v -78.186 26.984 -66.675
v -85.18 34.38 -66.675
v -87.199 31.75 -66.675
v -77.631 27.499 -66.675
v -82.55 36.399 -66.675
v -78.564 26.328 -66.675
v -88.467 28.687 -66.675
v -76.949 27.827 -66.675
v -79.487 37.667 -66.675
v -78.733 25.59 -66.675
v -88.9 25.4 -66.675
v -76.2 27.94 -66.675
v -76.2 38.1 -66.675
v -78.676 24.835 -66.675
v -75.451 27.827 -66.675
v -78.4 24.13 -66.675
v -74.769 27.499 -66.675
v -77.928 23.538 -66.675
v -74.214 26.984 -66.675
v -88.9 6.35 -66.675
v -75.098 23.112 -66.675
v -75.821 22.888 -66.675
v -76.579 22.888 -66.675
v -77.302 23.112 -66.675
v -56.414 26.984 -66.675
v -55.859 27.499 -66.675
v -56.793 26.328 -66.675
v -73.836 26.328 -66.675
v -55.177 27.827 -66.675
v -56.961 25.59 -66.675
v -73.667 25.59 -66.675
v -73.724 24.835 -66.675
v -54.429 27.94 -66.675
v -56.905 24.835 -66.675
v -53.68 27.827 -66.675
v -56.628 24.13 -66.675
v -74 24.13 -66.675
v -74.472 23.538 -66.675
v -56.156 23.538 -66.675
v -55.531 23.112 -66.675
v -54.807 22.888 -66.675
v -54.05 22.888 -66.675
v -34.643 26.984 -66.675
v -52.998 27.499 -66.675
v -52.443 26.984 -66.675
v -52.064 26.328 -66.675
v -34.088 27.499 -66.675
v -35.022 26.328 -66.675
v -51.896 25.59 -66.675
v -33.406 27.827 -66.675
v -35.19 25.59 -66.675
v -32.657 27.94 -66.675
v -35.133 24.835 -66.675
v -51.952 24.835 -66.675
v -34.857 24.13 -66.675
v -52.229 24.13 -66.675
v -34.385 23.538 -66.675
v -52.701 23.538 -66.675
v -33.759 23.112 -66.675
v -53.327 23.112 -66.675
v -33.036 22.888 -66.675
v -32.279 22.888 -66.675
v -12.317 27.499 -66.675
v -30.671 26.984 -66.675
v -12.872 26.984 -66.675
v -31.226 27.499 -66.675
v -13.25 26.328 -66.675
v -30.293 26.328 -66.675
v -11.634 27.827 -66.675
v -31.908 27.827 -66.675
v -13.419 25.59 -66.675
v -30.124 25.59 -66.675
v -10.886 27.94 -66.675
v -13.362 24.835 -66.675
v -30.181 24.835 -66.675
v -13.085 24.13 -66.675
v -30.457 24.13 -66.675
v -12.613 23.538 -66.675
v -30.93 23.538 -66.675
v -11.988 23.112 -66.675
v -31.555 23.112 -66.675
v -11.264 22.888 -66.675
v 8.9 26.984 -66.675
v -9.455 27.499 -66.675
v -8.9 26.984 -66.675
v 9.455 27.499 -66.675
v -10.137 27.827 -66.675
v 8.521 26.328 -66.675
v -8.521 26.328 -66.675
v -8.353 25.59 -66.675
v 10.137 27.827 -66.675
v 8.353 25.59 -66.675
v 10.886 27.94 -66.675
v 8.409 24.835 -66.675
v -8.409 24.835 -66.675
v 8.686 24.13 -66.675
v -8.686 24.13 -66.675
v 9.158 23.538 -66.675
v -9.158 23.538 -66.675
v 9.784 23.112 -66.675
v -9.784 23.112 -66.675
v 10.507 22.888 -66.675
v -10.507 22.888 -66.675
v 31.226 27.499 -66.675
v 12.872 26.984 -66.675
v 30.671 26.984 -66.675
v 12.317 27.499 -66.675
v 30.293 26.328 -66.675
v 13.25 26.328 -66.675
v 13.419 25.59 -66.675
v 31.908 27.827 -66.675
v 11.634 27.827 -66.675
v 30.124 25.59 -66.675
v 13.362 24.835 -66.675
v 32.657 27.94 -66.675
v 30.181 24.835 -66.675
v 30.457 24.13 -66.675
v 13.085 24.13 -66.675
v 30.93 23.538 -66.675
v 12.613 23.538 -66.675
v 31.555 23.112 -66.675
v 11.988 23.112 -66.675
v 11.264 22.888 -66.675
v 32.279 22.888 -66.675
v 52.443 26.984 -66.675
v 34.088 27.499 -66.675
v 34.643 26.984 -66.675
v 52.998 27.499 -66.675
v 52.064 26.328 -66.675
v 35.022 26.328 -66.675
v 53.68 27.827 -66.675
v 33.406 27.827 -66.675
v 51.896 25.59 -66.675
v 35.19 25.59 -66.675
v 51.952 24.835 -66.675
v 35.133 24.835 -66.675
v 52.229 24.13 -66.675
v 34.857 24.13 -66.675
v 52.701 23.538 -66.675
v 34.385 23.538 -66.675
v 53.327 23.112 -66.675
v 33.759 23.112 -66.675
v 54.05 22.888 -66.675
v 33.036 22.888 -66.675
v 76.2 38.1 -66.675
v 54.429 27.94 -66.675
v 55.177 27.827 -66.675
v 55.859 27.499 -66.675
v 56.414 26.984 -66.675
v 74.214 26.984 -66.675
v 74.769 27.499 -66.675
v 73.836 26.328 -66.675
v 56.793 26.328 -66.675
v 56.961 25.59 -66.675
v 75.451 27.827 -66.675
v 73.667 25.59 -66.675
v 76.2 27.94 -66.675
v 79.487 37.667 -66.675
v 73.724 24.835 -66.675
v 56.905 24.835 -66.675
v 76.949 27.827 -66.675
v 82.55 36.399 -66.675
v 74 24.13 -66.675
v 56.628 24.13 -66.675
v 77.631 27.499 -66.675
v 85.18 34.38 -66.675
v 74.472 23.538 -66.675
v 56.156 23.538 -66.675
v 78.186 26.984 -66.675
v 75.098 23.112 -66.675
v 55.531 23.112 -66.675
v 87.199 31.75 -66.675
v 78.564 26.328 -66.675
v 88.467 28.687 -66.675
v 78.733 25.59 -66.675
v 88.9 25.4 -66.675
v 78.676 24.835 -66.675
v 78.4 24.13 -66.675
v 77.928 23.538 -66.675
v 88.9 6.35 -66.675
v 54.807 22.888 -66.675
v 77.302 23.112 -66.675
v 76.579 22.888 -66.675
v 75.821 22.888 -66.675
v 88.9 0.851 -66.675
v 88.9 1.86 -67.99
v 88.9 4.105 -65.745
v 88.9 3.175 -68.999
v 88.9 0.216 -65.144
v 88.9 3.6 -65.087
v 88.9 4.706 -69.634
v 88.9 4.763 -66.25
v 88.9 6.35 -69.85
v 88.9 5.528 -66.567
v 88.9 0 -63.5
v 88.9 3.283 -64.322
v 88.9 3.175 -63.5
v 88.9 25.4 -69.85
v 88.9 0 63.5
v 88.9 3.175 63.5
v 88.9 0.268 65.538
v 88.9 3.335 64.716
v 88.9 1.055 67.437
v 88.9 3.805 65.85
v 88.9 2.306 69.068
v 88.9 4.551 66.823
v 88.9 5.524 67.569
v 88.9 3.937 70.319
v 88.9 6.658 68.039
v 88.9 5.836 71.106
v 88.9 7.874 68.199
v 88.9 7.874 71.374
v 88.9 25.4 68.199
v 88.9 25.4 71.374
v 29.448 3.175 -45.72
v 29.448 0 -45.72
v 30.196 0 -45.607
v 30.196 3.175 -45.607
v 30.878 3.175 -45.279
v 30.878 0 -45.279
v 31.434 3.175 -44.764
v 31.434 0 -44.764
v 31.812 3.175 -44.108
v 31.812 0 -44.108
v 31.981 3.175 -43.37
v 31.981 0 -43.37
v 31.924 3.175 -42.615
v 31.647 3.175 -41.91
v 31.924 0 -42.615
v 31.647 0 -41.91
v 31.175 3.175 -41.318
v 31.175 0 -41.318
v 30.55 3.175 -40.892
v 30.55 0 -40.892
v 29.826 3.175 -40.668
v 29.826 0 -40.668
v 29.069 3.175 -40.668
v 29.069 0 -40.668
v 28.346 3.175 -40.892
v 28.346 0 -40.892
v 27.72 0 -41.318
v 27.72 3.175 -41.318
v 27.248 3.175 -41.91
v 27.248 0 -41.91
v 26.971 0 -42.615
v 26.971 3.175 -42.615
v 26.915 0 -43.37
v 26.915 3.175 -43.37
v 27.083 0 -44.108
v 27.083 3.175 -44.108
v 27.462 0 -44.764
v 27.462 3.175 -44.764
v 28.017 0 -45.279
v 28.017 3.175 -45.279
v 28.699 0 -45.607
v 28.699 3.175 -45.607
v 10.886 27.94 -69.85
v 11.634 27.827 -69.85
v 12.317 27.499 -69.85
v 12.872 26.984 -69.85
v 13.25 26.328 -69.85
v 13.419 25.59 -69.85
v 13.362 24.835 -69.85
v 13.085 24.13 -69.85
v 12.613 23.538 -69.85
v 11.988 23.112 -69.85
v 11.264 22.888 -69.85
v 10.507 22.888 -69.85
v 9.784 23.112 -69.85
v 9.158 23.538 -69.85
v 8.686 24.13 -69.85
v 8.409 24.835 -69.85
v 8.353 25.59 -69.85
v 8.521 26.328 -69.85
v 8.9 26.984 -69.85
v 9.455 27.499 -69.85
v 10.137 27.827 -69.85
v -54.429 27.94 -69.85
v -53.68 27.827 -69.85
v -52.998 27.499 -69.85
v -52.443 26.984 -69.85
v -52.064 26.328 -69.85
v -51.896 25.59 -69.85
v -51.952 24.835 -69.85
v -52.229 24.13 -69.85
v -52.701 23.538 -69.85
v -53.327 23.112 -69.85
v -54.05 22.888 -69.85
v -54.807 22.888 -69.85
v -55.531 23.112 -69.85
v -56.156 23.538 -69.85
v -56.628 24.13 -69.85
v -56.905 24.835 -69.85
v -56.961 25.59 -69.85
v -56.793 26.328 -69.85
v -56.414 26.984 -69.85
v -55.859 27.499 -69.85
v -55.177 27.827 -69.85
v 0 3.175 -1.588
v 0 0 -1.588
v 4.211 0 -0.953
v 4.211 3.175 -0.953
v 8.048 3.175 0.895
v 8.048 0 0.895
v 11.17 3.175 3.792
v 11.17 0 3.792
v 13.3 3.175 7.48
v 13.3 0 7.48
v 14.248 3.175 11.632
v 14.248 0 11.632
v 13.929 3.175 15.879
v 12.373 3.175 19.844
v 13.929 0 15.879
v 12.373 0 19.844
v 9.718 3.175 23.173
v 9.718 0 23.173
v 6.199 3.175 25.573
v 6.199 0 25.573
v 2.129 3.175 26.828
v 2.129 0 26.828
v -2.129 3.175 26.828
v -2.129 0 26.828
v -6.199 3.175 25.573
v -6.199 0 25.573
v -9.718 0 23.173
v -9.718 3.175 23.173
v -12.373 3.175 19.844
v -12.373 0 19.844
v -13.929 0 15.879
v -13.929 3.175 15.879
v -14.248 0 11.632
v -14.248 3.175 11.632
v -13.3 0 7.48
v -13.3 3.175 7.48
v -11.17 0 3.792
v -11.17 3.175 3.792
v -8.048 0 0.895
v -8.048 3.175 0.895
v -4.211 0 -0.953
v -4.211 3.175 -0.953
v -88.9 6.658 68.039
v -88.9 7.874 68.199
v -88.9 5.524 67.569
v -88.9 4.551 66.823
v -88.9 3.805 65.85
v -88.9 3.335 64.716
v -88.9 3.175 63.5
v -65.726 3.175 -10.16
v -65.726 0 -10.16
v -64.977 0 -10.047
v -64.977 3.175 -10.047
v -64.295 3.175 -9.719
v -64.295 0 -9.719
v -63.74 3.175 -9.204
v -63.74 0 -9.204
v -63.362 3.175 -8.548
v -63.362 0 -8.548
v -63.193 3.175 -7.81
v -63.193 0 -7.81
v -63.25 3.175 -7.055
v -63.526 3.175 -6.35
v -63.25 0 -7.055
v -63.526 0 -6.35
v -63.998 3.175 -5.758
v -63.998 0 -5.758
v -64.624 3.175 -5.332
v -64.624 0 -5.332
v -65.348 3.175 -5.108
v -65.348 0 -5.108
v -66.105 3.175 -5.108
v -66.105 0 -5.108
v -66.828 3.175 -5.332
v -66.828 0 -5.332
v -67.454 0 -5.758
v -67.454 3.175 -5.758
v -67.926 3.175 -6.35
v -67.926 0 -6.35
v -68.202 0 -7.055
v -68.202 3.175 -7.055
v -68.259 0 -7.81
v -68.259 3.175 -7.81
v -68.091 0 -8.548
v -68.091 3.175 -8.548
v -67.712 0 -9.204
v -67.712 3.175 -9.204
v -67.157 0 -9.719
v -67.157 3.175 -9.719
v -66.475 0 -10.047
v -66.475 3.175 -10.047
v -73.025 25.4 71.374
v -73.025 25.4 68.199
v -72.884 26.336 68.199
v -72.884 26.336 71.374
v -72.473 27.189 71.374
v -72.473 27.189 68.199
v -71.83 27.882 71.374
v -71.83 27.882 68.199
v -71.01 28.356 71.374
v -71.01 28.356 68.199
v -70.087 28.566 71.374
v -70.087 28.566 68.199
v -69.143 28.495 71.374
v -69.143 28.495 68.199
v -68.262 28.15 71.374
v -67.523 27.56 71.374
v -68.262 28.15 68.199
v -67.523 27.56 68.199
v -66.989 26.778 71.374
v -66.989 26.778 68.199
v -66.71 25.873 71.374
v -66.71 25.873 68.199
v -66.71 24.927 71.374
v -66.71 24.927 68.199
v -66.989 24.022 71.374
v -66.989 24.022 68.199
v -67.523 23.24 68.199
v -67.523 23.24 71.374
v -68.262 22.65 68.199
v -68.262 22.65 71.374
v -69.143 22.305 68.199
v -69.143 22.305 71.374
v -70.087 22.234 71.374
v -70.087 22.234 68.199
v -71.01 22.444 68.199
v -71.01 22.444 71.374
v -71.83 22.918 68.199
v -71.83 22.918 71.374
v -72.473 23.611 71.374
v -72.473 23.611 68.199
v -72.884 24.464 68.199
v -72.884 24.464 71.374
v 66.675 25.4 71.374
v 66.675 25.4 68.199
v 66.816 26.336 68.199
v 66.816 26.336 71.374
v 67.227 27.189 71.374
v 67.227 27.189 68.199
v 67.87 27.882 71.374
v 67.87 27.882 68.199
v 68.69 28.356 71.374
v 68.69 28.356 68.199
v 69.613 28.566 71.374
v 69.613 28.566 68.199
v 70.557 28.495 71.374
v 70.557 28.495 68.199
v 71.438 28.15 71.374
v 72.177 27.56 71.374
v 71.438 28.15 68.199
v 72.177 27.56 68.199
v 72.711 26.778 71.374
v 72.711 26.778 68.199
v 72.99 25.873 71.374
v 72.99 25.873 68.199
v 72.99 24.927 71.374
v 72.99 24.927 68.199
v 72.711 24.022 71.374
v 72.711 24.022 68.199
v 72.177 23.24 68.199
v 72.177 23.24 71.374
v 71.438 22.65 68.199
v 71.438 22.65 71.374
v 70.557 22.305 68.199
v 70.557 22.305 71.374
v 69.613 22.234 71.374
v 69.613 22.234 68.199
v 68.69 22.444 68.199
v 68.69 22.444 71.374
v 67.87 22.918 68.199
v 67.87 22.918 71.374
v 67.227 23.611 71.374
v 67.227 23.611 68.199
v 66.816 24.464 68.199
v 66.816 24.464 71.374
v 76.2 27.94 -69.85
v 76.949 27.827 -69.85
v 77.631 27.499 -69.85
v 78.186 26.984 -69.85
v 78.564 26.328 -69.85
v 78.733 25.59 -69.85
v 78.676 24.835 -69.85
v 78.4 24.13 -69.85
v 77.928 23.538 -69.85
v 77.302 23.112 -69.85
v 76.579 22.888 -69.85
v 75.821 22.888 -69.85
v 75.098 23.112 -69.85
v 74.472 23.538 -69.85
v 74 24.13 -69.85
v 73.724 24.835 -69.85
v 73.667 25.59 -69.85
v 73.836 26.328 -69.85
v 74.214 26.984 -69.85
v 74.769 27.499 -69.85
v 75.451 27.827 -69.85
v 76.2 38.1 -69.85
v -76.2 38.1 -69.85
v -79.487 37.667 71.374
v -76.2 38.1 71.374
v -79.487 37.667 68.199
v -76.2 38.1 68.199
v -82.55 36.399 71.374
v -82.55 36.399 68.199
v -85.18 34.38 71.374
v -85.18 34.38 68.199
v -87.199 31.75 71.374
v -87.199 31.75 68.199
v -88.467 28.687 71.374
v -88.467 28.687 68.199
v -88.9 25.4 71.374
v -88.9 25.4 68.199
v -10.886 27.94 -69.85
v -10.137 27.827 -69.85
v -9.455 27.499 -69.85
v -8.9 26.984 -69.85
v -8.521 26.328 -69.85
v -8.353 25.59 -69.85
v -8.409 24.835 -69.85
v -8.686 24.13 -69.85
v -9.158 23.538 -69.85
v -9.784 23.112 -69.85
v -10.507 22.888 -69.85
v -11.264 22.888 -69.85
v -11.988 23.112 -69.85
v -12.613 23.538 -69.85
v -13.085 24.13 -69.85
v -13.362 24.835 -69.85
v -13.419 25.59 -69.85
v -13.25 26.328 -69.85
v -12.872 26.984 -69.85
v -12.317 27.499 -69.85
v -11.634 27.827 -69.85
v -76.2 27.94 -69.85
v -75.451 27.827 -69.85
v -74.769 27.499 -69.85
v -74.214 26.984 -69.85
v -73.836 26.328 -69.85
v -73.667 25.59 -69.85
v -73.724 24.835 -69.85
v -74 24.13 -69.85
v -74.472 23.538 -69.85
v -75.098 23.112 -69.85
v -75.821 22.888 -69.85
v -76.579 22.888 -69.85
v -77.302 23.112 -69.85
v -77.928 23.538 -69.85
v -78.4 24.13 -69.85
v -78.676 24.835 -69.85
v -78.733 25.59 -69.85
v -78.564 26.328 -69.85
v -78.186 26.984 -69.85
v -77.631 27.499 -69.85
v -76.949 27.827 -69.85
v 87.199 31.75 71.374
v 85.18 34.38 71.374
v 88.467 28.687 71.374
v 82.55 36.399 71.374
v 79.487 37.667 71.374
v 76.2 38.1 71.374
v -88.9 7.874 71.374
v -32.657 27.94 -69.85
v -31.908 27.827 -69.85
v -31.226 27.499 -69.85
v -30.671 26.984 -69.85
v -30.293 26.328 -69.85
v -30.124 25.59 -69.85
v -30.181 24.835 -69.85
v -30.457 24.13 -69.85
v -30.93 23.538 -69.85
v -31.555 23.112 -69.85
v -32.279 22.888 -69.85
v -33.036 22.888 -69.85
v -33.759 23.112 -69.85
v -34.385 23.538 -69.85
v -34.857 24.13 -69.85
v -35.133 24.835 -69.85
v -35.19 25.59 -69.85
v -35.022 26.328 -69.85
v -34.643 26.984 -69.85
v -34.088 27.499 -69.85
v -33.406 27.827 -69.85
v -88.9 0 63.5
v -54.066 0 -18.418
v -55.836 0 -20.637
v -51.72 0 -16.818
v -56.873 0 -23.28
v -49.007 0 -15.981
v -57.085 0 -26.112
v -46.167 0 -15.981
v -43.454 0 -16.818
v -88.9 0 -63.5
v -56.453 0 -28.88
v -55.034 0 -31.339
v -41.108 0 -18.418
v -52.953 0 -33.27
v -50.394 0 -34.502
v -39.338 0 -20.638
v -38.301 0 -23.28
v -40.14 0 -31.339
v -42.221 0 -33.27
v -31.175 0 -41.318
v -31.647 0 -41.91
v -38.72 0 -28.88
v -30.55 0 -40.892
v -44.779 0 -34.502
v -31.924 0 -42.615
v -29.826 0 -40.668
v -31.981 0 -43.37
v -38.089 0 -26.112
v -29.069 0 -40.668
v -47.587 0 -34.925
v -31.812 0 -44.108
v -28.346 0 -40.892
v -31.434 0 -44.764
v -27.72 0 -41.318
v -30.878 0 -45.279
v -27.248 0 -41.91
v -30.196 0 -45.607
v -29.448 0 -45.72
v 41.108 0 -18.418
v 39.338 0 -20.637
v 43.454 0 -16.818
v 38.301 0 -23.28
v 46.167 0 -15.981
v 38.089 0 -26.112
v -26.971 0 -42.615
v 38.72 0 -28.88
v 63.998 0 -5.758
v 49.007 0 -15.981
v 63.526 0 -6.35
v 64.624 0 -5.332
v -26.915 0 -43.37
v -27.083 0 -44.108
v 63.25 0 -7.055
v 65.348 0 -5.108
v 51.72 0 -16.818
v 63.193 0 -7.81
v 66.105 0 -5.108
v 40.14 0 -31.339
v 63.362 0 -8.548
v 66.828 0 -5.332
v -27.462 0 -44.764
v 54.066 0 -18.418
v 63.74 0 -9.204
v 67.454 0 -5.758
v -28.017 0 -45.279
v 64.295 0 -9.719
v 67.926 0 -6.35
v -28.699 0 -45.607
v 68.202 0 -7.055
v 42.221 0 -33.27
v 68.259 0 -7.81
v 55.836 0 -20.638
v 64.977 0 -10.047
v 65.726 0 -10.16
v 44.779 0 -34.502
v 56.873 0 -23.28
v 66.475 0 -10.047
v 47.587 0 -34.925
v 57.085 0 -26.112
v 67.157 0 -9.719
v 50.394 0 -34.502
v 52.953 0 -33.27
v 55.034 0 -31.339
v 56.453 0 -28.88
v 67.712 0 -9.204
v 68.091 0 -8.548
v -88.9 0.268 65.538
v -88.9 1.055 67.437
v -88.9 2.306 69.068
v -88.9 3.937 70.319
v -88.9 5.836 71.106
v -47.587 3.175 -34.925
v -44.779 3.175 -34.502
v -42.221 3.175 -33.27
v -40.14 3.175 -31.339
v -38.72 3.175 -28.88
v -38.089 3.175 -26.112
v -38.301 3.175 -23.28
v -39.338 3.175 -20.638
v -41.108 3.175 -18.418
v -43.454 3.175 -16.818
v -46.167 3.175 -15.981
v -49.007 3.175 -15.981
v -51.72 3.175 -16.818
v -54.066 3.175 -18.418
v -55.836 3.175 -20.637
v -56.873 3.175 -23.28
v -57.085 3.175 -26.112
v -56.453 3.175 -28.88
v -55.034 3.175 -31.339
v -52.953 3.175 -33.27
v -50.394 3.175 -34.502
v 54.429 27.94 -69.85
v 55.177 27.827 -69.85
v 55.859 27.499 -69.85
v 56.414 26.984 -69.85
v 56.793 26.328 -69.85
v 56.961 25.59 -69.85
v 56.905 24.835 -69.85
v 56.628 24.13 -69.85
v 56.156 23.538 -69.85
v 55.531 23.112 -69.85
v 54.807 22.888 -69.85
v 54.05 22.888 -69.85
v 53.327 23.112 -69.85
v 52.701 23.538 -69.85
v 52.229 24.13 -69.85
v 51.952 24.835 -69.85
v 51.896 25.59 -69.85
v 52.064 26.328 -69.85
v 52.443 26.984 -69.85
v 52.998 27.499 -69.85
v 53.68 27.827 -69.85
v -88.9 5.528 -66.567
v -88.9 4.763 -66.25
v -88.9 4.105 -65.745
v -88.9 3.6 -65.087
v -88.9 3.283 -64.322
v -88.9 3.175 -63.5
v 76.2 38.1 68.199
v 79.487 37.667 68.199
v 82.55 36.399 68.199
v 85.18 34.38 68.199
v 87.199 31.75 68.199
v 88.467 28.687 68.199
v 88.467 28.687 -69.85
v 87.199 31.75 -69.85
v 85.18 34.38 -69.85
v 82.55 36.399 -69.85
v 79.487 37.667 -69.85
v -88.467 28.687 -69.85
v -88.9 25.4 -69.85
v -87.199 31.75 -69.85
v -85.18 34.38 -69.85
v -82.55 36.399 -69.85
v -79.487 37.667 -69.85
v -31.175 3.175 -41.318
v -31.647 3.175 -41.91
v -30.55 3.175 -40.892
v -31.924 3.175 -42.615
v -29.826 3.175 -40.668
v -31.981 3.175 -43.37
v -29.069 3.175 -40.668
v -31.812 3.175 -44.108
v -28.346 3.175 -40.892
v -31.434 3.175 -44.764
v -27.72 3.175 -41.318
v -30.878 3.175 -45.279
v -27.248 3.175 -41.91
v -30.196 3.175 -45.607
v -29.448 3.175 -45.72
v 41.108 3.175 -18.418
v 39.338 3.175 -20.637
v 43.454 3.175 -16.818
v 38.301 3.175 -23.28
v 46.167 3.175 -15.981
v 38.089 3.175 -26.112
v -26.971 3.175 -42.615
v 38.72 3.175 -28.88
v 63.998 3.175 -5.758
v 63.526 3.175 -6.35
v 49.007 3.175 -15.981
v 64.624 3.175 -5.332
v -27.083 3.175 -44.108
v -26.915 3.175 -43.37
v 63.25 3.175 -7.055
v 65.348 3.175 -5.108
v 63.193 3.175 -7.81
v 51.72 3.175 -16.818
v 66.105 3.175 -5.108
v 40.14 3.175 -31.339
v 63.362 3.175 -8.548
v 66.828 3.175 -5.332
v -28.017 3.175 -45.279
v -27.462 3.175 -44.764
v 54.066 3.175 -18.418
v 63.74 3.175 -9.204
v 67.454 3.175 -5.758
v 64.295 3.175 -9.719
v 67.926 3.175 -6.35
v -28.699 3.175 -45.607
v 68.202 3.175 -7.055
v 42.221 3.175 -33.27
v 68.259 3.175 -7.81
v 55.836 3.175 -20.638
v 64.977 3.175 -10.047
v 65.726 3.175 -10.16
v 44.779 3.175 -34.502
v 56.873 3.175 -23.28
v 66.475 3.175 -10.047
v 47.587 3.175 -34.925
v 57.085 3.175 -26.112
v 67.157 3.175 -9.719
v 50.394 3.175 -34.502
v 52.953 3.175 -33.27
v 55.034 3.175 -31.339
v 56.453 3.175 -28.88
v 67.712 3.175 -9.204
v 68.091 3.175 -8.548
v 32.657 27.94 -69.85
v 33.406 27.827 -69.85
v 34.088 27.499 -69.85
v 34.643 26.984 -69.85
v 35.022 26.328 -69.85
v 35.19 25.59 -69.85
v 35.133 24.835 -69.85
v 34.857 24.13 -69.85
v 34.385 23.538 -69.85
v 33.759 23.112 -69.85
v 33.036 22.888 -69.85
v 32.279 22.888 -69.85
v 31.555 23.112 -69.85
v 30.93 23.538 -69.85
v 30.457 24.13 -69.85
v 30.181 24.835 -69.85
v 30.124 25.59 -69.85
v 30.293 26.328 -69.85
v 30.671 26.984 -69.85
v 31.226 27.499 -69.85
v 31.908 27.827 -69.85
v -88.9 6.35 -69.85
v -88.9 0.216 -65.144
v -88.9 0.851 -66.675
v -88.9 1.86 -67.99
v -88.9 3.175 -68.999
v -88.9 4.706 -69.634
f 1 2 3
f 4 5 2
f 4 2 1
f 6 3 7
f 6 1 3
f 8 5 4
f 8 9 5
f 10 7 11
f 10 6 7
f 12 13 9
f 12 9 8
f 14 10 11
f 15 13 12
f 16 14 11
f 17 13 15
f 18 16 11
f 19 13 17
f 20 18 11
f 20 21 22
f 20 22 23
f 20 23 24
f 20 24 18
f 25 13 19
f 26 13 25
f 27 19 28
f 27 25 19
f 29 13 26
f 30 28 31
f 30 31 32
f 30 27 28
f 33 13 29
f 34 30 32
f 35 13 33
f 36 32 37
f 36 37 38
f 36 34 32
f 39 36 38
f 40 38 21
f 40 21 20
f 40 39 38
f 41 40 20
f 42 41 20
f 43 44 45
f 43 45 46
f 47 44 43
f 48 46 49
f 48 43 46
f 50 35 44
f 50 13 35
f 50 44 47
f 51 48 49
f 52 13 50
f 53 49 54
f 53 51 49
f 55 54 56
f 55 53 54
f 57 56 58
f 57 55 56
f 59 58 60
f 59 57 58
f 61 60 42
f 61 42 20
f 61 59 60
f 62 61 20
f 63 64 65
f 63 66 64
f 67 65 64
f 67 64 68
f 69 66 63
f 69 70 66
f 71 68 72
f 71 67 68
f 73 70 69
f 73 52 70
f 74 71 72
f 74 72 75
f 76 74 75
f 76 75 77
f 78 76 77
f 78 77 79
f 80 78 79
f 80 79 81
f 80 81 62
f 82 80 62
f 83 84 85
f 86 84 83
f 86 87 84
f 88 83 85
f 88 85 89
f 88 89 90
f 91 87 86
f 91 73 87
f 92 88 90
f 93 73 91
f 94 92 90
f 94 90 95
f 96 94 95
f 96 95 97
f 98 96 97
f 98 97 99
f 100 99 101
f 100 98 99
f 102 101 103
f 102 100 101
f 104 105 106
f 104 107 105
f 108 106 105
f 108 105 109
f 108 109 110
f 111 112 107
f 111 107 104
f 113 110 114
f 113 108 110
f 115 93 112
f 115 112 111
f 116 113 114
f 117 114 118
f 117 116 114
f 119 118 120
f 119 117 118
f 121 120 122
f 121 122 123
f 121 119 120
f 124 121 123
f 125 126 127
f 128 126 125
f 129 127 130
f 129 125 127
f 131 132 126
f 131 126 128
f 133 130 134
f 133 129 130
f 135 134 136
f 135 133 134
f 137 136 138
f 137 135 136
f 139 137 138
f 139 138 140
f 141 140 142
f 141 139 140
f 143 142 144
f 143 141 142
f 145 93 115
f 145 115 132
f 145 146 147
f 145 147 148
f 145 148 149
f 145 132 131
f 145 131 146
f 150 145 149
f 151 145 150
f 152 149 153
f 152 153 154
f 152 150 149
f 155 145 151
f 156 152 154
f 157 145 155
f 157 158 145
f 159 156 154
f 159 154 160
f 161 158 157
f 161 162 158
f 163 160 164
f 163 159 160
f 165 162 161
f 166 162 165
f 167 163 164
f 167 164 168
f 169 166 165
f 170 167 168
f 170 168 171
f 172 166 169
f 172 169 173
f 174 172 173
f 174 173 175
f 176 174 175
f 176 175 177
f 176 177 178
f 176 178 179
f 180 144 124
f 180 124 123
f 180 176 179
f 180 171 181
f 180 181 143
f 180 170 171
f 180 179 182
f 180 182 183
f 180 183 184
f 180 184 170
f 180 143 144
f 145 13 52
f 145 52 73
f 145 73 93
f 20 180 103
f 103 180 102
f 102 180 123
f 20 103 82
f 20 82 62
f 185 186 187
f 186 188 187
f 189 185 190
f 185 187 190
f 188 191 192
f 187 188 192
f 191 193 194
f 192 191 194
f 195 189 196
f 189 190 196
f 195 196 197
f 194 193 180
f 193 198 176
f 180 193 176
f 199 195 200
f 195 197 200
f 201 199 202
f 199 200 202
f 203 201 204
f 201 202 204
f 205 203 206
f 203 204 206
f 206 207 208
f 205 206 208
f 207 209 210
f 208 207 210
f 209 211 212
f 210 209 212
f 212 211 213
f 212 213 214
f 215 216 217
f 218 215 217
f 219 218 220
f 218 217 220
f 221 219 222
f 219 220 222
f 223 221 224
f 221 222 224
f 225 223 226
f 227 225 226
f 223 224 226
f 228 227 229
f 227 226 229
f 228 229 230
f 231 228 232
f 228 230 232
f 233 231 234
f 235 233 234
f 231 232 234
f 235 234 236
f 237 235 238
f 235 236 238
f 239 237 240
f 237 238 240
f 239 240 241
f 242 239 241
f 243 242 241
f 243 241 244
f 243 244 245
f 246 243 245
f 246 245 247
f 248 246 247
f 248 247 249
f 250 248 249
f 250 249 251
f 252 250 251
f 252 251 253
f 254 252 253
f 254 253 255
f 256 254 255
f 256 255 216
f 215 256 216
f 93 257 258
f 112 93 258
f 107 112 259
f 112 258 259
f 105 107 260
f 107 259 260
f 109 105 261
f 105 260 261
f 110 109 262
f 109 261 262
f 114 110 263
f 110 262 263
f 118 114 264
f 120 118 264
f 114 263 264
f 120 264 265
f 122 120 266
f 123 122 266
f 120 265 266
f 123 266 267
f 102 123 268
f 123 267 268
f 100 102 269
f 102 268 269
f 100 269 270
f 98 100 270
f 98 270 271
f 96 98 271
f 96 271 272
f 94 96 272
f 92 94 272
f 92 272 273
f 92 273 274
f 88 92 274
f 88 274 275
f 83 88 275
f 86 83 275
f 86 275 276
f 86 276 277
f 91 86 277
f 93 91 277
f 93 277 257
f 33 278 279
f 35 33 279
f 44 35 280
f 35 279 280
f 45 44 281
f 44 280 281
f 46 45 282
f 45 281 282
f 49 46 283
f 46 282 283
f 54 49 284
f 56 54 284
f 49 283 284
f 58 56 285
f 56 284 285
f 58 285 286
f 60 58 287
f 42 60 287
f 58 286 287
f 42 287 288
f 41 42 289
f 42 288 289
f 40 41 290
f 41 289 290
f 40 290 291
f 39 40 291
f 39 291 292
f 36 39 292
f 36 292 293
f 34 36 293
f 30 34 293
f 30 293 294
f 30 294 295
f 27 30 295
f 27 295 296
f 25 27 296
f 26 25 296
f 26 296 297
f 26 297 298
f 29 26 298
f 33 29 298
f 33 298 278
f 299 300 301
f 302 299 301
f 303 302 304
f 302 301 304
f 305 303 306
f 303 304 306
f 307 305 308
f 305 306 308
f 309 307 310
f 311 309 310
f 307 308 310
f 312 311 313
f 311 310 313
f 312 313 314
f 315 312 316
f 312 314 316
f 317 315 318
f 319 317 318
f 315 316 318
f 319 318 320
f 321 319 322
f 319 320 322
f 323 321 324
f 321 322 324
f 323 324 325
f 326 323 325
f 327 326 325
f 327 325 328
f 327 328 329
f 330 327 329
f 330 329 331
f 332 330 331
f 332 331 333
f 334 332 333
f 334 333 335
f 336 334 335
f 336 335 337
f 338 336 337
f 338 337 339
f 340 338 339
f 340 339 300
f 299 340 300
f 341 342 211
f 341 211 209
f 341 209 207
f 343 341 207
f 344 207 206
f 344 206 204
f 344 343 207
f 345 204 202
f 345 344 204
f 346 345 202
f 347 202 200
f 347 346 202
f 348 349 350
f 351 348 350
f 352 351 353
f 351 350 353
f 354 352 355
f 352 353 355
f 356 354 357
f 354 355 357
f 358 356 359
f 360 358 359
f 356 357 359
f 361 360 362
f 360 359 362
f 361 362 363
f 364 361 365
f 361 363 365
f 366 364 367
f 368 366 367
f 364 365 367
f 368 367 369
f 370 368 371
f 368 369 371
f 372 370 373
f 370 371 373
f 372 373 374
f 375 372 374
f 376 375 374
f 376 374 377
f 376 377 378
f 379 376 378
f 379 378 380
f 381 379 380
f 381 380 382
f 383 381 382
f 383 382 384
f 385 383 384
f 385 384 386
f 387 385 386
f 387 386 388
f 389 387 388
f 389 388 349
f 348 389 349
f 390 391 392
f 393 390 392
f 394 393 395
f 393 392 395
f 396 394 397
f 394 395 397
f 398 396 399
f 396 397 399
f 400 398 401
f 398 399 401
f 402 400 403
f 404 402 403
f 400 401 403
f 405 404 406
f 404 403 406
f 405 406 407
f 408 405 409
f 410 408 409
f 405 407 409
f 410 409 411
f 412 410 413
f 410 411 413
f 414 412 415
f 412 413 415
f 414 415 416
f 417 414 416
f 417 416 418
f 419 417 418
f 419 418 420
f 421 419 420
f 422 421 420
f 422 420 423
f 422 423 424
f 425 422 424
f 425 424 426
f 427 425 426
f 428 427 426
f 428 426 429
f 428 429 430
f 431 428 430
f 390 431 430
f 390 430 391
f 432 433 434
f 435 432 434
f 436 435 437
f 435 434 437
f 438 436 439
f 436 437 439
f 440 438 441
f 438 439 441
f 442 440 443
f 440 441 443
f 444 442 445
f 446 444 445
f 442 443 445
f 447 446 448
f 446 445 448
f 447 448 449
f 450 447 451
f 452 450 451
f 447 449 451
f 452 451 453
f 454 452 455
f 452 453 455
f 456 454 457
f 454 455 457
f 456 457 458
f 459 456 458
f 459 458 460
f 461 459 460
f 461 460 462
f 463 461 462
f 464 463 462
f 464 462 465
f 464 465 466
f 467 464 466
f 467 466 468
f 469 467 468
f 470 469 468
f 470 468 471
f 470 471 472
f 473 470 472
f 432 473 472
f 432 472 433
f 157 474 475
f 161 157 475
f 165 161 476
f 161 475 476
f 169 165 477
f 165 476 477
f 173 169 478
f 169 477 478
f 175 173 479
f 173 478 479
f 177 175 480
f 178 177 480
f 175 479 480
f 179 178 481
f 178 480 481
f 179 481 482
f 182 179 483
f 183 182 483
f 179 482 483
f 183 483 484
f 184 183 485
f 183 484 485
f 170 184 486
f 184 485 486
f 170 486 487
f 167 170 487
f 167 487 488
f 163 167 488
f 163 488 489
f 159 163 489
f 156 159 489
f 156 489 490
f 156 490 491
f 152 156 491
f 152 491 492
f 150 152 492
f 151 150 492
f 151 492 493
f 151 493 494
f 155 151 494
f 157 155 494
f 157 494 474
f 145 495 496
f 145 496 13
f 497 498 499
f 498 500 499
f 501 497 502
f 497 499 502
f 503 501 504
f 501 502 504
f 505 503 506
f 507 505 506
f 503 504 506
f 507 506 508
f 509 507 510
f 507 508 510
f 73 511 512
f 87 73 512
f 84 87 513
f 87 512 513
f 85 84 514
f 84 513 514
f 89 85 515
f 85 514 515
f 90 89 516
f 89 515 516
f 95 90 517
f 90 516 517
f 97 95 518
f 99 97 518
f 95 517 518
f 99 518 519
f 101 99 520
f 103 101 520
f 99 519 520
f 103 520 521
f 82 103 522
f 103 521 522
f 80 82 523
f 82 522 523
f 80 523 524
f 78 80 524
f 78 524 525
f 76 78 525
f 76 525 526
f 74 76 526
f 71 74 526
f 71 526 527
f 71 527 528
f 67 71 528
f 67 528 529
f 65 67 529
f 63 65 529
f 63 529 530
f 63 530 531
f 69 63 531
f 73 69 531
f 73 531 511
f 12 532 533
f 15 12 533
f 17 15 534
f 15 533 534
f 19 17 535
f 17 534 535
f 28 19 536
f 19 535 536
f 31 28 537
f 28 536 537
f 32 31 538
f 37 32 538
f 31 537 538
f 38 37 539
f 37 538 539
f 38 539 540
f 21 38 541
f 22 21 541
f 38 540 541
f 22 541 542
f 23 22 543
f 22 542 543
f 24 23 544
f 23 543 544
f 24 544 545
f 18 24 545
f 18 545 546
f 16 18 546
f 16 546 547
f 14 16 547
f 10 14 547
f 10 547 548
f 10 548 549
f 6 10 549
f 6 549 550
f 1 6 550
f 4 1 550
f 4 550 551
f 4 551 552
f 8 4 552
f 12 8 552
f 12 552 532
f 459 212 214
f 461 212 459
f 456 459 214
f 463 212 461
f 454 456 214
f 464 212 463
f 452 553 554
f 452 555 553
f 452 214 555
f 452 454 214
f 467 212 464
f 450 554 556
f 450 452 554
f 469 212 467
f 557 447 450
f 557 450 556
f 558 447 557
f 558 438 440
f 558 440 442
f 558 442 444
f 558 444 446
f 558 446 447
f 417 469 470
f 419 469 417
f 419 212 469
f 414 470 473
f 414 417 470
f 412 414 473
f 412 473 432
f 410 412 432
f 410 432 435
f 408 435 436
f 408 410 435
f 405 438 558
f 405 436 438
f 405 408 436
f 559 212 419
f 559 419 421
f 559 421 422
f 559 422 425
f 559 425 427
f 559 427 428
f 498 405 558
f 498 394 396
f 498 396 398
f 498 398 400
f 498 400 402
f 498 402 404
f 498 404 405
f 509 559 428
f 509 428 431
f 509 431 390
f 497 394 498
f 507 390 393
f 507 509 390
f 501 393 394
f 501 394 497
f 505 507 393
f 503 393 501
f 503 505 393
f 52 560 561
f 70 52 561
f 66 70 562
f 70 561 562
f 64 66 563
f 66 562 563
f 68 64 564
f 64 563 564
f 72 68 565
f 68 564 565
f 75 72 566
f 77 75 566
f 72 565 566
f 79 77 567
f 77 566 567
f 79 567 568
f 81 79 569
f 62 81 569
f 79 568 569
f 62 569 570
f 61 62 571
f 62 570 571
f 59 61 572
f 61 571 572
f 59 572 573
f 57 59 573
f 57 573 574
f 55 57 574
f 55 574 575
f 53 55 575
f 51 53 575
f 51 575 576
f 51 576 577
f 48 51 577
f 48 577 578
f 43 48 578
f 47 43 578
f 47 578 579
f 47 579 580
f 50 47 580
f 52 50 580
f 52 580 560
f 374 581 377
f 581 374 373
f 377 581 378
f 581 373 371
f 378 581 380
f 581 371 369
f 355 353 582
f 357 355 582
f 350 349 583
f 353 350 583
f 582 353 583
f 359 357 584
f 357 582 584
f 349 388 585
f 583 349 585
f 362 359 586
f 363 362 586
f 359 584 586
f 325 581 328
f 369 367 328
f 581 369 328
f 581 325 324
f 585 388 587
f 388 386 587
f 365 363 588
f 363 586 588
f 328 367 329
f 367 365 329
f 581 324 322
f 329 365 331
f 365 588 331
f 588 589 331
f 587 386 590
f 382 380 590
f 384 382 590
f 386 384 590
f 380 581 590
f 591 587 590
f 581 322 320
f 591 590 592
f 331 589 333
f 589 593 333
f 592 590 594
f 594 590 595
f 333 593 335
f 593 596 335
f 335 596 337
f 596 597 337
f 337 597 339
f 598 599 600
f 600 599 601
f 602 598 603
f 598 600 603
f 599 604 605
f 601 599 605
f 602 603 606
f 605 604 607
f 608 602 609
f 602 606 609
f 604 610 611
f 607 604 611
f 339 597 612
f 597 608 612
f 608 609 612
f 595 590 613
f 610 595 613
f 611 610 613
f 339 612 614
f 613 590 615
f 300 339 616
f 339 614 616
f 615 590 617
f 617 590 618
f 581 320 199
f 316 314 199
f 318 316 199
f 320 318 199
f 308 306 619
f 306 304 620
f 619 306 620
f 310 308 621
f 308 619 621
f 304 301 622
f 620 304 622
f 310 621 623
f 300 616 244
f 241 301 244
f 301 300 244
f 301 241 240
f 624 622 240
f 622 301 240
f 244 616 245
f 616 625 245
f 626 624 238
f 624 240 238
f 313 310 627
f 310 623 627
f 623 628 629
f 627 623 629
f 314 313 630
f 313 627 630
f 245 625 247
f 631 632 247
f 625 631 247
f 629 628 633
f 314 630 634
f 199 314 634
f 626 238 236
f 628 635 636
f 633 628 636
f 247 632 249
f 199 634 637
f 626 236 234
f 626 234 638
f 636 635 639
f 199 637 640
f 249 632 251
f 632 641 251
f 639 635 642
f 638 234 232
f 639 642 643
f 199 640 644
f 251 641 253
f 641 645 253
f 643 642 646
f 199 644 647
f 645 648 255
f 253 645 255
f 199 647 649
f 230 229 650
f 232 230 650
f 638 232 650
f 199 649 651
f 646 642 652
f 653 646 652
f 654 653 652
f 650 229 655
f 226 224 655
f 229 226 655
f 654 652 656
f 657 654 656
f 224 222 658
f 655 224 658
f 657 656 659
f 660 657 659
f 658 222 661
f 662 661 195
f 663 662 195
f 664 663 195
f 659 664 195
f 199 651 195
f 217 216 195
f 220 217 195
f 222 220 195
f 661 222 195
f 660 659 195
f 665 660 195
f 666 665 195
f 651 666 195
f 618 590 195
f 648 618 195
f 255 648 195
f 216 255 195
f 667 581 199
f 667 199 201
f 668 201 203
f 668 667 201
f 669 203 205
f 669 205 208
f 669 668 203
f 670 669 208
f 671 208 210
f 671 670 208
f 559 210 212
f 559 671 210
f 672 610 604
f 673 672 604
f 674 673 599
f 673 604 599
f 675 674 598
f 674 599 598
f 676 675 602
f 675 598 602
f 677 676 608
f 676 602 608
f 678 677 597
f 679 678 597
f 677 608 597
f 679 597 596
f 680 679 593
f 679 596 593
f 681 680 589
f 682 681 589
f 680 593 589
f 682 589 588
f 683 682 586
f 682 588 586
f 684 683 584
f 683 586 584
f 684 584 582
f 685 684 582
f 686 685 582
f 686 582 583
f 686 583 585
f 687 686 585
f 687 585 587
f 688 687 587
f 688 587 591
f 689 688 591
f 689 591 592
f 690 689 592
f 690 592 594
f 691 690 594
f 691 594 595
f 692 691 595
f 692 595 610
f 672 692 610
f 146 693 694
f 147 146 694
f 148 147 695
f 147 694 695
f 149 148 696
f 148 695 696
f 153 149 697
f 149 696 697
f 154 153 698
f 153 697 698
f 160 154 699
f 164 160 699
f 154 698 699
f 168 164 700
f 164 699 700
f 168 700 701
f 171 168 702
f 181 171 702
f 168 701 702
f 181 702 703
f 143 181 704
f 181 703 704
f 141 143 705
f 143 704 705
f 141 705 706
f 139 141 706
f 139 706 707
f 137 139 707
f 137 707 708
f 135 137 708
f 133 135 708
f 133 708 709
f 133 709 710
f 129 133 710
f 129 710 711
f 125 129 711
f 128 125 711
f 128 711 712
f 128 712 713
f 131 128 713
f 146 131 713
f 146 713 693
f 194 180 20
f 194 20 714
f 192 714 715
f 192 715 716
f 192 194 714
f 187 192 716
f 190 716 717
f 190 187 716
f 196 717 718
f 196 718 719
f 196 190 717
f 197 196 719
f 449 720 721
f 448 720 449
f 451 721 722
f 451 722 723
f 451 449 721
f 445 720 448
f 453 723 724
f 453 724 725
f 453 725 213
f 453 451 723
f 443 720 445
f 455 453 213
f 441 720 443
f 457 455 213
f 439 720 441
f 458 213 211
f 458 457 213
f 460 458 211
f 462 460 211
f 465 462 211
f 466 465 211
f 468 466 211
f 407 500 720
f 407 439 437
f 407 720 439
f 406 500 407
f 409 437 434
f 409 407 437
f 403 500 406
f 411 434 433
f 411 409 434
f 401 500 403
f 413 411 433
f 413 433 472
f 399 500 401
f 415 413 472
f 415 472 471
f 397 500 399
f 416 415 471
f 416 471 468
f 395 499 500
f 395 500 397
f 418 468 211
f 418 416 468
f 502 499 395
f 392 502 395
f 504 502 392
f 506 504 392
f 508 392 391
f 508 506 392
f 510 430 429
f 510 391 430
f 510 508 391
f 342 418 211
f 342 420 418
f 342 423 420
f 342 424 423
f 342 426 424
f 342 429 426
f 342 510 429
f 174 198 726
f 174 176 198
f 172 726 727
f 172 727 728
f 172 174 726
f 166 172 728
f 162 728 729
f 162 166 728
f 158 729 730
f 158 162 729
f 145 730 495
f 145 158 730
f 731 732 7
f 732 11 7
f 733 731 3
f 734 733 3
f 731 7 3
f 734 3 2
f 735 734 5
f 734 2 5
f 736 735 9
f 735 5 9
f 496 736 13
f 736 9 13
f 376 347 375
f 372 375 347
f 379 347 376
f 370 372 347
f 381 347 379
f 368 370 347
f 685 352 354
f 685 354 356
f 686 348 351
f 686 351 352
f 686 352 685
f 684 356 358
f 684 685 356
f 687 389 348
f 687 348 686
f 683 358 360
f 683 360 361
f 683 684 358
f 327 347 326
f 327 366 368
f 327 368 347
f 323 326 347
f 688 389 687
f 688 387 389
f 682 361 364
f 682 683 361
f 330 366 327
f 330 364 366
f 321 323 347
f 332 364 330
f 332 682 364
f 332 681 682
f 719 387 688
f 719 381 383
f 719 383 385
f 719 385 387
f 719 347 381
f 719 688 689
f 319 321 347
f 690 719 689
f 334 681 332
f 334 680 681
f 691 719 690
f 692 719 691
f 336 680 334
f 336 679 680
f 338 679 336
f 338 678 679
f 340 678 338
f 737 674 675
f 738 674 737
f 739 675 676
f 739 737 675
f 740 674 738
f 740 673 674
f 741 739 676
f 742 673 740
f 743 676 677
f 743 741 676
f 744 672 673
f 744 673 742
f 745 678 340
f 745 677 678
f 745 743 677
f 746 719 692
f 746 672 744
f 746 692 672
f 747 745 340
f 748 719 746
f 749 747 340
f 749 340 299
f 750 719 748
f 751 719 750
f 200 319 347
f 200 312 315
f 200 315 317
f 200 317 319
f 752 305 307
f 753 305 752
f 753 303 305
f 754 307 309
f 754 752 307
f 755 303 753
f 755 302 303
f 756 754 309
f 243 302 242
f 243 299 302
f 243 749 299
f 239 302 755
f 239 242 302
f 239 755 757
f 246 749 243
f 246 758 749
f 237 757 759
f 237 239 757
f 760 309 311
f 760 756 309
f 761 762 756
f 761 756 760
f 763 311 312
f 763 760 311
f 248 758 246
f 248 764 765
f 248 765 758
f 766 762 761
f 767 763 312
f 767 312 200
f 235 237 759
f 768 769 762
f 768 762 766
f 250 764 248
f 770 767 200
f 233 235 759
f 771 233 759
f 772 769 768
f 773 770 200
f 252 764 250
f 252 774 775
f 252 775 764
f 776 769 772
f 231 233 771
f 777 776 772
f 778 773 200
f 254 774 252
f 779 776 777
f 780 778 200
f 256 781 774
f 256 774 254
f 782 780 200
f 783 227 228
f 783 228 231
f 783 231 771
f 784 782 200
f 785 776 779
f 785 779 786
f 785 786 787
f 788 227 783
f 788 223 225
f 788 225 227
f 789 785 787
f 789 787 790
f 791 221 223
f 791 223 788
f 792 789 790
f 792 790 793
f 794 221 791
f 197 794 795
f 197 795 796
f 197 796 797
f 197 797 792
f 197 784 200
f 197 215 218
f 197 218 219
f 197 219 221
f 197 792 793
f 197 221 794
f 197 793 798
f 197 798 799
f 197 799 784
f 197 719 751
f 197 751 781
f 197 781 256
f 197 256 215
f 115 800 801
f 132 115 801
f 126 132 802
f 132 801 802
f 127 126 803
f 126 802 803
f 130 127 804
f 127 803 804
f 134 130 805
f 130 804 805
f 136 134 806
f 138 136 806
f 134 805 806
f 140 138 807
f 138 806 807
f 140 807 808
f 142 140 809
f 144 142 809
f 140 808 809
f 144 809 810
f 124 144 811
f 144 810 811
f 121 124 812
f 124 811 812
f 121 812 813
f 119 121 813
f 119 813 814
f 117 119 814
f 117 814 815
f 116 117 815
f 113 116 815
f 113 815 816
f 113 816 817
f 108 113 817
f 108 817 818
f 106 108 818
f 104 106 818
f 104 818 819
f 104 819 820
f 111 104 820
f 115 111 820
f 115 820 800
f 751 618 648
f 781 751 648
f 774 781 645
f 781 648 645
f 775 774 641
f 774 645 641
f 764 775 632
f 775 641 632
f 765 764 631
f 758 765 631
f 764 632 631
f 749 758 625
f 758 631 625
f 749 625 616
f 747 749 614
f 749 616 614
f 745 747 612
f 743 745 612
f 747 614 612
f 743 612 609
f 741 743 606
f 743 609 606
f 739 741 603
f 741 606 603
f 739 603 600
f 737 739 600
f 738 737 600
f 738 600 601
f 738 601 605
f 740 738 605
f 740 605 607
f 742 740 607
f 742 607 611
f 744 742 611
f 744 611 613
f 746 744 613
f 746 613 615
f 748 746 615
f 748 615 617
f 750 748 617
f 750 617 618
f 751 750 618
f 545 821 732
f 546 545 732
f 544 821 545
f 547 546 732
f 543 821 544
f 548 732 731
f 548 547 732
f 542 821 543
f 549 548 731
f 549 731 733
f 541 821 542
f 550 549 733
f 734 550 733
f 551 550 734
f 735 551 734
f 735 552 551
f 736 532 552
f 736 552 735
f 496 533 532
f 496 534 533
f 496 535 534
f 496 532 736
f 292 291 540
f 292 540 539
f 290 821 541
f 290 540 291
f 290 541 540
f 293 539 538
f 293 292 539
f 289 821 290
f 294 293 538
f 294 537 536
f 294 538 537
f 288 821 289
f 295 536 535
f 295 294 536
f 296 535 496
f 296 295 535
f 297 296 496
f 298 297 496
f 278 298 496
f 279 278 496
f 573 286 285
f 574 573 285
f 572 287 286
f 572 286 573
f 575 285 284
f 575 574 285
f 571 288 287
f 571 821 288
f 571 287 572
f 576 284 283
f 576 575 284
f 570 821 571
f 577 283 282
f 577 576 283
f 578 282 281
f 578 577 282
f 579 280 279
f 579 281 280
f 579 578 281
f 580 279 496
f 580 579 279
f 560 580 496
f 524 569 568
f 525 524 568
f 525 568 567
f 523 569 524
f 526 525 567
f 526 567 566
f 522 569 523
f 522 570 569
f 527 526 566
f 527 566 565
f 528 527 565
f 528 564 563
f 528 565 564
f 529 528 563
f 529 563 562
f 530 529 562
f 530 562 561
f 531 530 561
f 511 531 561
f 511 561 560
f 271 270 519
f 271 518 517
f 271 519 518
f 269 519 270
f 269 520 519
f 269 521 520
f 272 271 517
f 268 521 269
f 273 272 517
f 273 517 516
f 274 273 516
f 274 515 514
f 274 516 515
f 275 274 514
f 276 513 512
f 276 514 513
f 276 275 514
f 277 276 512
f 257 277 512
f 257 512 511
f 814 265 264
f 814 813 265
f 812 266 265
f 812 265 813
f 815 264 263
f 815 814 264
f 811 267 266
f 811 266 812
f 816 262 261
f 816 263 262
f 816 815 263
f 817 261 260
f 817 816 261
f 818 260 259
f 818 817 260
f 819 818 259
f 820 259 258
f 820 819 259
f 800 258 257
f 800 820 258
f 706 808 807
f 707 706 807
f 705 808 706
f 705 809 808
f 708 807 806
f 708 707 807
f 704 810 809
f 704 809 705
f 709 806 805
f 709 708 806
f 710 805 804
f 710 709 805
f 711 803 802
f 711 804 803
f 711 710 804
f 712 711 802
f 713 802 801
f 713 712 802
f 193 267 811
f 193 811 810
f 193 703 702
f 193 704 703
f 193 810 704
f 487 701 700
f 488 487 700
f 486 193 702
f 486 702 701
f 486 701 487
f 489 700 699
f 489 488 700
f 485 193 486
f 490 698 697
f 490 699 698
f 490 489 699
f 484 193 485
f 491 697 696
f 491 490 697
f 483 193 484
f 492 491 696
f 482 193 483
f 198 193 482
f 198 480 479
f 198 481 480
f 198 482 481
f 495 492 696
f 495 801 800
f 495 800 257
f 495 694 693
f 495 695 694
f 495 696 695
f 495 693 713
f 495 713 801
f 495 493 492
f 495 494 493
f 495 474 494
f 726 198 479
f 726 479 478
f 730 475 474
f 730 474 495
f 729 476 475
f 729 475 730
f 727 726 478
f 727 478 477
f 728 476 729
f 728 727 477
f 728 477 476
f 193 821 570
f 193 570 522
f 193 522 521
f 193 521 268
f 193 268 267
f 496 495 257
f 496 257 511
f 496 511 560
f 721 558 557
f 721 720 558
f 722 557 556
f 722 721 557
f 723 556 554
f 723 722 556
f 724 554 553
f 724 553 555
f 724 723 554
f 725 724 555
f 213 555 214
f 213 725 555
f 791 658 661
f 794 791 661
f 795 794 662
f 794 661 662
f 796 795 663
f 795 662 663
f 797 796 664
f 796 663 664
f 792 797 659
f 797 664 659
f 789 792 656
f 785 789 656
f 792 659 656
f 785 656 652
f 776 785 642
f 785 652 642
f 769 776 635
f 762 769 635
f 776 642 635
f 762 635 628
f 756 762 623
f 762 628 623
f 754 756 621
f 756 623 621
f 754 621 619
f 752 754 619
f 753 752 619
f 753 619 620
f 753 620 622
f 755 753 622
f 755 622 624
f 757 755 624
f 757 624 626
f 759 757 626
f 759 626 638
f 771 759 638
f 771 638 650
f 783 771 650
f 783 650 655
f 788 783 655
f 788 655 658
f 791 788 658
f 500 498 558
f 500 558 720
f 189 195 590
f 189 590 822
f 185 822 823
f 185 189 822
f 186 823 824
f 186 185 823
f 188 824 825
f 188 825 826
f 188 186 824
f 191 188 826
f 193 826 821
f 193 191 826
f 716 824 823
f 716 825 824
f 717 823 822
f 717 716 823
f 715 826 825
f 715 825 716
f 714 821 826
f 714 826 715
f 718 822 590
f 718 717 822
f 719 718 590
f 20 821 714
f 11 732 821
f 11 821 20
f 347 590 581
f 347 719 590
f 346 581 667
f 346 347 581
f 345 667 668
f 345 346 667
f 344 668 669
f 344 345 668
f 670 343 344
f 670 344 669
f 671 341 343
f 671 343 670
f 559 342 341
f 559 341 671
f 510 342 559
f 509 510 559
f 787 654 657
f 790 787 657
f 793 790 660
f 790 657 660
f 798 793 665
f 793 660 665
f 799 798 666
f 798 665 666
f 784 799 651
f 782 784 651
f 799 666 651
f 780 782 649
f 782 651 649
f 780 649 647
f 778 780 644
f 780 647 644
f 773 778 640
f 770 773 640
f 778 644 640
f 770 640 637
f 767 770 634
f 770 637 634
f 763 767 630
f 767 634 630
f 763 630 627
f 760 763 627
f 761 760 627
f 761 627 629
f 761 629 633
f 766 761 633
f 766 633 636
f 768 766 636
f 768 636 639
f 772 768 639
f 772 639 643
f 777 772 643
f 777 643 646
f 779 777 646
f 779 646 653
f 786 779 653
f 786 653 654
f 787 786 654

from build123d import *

# Parameters (mm, degrees)
SKETCH1_W           = 177.8
SKETCH1_H           = 127
BOSS_EXTRUDE1_DEPTH = 3.175
EDGE_FLANGE1_DEPTH  = 177.8
EDGE_FLANGE2_DEPTH  = 177.8
SKETCH17_R          = 2.54
CUT_EXTRUDE1_DEPTH  = 5.08
FILLET1_R           = 12.7
SKETCH18_R          = 3.175
CUT_EXTRUDE2_DEPTH  = 5.08
SKETCH19_R          = 14.2875
CUT_EXTRUDE3_DEPTH  = 12.7
SKETCH20_R          = 9.525
CUT_EXTRUDE4_DEPTH  = 12.7
SKETCH21_R          = 2.54
CUT_EXTRUDE6_DEPTH  = 12.7


# Sheet-metal steps are written as plain solids
with BuildPart() as part:
    # Sketch1 → Boss-Extrude1 (new body)
    with BuildSketch(Plane(origin=(0, 0, 0), x_dir=(1, 0, 0), z_dir=(0, 1, 0))):
        Rectangle(SKETCH1_W, SKETCH1_H)
    extrude(amount=BOSS_EXTRUDE1_DEPTH)

    # Edge-Flange1 section (across the edge) → Edge-Flange1 (add)
    with BuildSketch(Plane(origin=(88.9, 3.175, -66.675), x_dir=(0, 0, 1), z_dir=(-1, 0, 0))):
        with BuildLine():
            Line((-3.175, 3.175), (-3.175, 34.925))
            Line((-3.175, 34.925), (0, 34.925))
            Line((0, 34.925), (0, 3.175))
            ThreePointArc((0, 3.175), (0.92993597, 0.92993597), (3.175, 0))
            Line((3.175, 0), (3.175, -3.175))
            ThreePointArc((3.175, -3.175), (-1.315128061, -1.315128061), (-3.175, 3.175))
        make_face()
    extrude(amount=EDGE_FLANGE1_DEPTH)

    # Edge-Flange2 section (across the edge) → Edge-Flange2 (add)
    with BuildSketch(Plane(origin=(-88.9, 3.175, 68.199), x_dir=(0, 0, -1), z_dir=(1, 0, 0))):
        with BuildLine():
            Line((-3.175, 4.699), (-3.175, 34.925))
            Line((-3.175, 34.925), (0, 34.925))
            Line((0, 34.925), (0, 4.699))
            ThreePointArc((0, 4.699), (1.376305235, 1.376305235), (4.699, 0))
            Line((4.699, 0), (4.699, -3.175))
            ThreePointArc((4.699, -3.175), (-0.868758795, -0.868758795), (-3.175, 4.699))
        make_face()
    extrude(amount=EDGE_FLANGE2_DEPTH)

    # Sketch17 → Cut-Extrude1 (cut)
    with BuildSketch(Plane(origin=(0, 0, -69.85), x_dir=(-1, 0, 0), z_dir=(0, 0, -1))):
        with Locations(Location((-76.2, 25.4, 0), (0, 0, 90))):
            Circle(SKETCH17_R)
        with Locations(Location((-54.428571429, 25.4, 0), (0, 0, 90))):
            Circle(SKETCH17_R)
        with Locations(Location((-32.657142857, 25.4, 0), (0, 0, 90))):
            Circle(SKETCH17_R)
        with Locations(Location((-10.885714286, 25.4, 0), (0, 0, 90))):
            Circle(SKETCH17_R)
        with Locations(Location((10.885714286, 25.4, 0), (0, 0, 90))):
            Circle(SKETCH17_R)
        with Locations(Location((32.657142857, 25.4, 0), (0, 0, 90))):
            Circle(SKETCH17_R)
        with Locations(Location((54.428571429, 25.4, 0), (0, 0, 90))):
            Circle(SKETCH17_R)
        with Locations(Location((76.2, 25.4, 0), (0, 0, 90))):
            Circle(SKETCH17_R)
    extrude(amount=-CUT_EXTRUDE1_DEPTH, mode=Mode.SUBTRACT)

    # Fillet1
    fillet1_edges = [part.edges().sort_by_distance(p)[0] for p in [
        (88.9, 38.1, -68.2625),
        (-88.9, 38.1, -68.2625),
        (-88.9, 38.1, 69.7865),
        (88.9, 38.1, 69.7865),
    ]]
    fillet(fillet1_edges, radius=FILLET1_R)

    # Sketch18 → Cut-Extrude2 (cut)
    with BuildSketch(Plane(origin=(0, 0, 68.199), x_dir=(-1, 0, 0), z_dir=(0, 0, -1))):
        with Locations((69.85, 25.4)):
            Circle(SKETCH18_R)
        with Locations((-69.85, 25.4)):
            Circle(SKETCH18_R)
    extrude(amount=-CUT_EXTRUDE2_DEPTH, mode=Mode.SUBTRACT)

    # Sketch19 → Cut-Extrude3 (cut)
    with BuildSketch(Plane(origin=(0, 0, 0), x_dir=(-1, 0, 0), z_dir=(0, -1, 0))):
        with Locations(Location((0, -12.7, 0), (0, 0, 90))):
            Circle(SKETCH19_R)
    extrude(amount=-CUT_EXTRUDE3_DEPTH, mode=Mode.SUBTRACT)

    # Sketch20 → Cut-Extrude4 (cut)
    with BuildSketch(Plane.XZ):
        with Locations(Location((47.586884748, -25.4, 0), (0, 0, 270))):
            Circle(SKETCH20_R)
        with Locations(Location((-47.586884748, -25.4, 0), (0, 0, 270))):
            Circle(SKETCH20_R)
    extrude(amount=-CUT_EXTRUDE4_DEPTH, mode=Mode.SUBTRACT)

    # Sketch21 → Cut-Extrude6 (cut)
    with BuildSketch(Plane(origin=(0, 0, 0), x_dir=(-1, 0, 0), z_dir=(0, -1, 0))):
        with Locations(Location((-65.726112956, 7.62, 0), (0, 0, 90))):
            Circle(SKETCH21_R)
        with Locations(Location((-29.447656539, 43.18, 0), (0, 0, 90))):
            Circle(SKETCH21_R)
        with Locations(Location((65.726112956, 7.62, 0), (0, 0, 90))):
            Circle(SKETCH21_R)
        with Locations(Location((29.447656539, 43.18, 0), (0, 0, 90))):
            Circle(SKETCH21_R)
    extrude(amount=-CUT_EXTRUDE6_DEPTH, mode=Mode.SUBTRACT)


solid = part.part
